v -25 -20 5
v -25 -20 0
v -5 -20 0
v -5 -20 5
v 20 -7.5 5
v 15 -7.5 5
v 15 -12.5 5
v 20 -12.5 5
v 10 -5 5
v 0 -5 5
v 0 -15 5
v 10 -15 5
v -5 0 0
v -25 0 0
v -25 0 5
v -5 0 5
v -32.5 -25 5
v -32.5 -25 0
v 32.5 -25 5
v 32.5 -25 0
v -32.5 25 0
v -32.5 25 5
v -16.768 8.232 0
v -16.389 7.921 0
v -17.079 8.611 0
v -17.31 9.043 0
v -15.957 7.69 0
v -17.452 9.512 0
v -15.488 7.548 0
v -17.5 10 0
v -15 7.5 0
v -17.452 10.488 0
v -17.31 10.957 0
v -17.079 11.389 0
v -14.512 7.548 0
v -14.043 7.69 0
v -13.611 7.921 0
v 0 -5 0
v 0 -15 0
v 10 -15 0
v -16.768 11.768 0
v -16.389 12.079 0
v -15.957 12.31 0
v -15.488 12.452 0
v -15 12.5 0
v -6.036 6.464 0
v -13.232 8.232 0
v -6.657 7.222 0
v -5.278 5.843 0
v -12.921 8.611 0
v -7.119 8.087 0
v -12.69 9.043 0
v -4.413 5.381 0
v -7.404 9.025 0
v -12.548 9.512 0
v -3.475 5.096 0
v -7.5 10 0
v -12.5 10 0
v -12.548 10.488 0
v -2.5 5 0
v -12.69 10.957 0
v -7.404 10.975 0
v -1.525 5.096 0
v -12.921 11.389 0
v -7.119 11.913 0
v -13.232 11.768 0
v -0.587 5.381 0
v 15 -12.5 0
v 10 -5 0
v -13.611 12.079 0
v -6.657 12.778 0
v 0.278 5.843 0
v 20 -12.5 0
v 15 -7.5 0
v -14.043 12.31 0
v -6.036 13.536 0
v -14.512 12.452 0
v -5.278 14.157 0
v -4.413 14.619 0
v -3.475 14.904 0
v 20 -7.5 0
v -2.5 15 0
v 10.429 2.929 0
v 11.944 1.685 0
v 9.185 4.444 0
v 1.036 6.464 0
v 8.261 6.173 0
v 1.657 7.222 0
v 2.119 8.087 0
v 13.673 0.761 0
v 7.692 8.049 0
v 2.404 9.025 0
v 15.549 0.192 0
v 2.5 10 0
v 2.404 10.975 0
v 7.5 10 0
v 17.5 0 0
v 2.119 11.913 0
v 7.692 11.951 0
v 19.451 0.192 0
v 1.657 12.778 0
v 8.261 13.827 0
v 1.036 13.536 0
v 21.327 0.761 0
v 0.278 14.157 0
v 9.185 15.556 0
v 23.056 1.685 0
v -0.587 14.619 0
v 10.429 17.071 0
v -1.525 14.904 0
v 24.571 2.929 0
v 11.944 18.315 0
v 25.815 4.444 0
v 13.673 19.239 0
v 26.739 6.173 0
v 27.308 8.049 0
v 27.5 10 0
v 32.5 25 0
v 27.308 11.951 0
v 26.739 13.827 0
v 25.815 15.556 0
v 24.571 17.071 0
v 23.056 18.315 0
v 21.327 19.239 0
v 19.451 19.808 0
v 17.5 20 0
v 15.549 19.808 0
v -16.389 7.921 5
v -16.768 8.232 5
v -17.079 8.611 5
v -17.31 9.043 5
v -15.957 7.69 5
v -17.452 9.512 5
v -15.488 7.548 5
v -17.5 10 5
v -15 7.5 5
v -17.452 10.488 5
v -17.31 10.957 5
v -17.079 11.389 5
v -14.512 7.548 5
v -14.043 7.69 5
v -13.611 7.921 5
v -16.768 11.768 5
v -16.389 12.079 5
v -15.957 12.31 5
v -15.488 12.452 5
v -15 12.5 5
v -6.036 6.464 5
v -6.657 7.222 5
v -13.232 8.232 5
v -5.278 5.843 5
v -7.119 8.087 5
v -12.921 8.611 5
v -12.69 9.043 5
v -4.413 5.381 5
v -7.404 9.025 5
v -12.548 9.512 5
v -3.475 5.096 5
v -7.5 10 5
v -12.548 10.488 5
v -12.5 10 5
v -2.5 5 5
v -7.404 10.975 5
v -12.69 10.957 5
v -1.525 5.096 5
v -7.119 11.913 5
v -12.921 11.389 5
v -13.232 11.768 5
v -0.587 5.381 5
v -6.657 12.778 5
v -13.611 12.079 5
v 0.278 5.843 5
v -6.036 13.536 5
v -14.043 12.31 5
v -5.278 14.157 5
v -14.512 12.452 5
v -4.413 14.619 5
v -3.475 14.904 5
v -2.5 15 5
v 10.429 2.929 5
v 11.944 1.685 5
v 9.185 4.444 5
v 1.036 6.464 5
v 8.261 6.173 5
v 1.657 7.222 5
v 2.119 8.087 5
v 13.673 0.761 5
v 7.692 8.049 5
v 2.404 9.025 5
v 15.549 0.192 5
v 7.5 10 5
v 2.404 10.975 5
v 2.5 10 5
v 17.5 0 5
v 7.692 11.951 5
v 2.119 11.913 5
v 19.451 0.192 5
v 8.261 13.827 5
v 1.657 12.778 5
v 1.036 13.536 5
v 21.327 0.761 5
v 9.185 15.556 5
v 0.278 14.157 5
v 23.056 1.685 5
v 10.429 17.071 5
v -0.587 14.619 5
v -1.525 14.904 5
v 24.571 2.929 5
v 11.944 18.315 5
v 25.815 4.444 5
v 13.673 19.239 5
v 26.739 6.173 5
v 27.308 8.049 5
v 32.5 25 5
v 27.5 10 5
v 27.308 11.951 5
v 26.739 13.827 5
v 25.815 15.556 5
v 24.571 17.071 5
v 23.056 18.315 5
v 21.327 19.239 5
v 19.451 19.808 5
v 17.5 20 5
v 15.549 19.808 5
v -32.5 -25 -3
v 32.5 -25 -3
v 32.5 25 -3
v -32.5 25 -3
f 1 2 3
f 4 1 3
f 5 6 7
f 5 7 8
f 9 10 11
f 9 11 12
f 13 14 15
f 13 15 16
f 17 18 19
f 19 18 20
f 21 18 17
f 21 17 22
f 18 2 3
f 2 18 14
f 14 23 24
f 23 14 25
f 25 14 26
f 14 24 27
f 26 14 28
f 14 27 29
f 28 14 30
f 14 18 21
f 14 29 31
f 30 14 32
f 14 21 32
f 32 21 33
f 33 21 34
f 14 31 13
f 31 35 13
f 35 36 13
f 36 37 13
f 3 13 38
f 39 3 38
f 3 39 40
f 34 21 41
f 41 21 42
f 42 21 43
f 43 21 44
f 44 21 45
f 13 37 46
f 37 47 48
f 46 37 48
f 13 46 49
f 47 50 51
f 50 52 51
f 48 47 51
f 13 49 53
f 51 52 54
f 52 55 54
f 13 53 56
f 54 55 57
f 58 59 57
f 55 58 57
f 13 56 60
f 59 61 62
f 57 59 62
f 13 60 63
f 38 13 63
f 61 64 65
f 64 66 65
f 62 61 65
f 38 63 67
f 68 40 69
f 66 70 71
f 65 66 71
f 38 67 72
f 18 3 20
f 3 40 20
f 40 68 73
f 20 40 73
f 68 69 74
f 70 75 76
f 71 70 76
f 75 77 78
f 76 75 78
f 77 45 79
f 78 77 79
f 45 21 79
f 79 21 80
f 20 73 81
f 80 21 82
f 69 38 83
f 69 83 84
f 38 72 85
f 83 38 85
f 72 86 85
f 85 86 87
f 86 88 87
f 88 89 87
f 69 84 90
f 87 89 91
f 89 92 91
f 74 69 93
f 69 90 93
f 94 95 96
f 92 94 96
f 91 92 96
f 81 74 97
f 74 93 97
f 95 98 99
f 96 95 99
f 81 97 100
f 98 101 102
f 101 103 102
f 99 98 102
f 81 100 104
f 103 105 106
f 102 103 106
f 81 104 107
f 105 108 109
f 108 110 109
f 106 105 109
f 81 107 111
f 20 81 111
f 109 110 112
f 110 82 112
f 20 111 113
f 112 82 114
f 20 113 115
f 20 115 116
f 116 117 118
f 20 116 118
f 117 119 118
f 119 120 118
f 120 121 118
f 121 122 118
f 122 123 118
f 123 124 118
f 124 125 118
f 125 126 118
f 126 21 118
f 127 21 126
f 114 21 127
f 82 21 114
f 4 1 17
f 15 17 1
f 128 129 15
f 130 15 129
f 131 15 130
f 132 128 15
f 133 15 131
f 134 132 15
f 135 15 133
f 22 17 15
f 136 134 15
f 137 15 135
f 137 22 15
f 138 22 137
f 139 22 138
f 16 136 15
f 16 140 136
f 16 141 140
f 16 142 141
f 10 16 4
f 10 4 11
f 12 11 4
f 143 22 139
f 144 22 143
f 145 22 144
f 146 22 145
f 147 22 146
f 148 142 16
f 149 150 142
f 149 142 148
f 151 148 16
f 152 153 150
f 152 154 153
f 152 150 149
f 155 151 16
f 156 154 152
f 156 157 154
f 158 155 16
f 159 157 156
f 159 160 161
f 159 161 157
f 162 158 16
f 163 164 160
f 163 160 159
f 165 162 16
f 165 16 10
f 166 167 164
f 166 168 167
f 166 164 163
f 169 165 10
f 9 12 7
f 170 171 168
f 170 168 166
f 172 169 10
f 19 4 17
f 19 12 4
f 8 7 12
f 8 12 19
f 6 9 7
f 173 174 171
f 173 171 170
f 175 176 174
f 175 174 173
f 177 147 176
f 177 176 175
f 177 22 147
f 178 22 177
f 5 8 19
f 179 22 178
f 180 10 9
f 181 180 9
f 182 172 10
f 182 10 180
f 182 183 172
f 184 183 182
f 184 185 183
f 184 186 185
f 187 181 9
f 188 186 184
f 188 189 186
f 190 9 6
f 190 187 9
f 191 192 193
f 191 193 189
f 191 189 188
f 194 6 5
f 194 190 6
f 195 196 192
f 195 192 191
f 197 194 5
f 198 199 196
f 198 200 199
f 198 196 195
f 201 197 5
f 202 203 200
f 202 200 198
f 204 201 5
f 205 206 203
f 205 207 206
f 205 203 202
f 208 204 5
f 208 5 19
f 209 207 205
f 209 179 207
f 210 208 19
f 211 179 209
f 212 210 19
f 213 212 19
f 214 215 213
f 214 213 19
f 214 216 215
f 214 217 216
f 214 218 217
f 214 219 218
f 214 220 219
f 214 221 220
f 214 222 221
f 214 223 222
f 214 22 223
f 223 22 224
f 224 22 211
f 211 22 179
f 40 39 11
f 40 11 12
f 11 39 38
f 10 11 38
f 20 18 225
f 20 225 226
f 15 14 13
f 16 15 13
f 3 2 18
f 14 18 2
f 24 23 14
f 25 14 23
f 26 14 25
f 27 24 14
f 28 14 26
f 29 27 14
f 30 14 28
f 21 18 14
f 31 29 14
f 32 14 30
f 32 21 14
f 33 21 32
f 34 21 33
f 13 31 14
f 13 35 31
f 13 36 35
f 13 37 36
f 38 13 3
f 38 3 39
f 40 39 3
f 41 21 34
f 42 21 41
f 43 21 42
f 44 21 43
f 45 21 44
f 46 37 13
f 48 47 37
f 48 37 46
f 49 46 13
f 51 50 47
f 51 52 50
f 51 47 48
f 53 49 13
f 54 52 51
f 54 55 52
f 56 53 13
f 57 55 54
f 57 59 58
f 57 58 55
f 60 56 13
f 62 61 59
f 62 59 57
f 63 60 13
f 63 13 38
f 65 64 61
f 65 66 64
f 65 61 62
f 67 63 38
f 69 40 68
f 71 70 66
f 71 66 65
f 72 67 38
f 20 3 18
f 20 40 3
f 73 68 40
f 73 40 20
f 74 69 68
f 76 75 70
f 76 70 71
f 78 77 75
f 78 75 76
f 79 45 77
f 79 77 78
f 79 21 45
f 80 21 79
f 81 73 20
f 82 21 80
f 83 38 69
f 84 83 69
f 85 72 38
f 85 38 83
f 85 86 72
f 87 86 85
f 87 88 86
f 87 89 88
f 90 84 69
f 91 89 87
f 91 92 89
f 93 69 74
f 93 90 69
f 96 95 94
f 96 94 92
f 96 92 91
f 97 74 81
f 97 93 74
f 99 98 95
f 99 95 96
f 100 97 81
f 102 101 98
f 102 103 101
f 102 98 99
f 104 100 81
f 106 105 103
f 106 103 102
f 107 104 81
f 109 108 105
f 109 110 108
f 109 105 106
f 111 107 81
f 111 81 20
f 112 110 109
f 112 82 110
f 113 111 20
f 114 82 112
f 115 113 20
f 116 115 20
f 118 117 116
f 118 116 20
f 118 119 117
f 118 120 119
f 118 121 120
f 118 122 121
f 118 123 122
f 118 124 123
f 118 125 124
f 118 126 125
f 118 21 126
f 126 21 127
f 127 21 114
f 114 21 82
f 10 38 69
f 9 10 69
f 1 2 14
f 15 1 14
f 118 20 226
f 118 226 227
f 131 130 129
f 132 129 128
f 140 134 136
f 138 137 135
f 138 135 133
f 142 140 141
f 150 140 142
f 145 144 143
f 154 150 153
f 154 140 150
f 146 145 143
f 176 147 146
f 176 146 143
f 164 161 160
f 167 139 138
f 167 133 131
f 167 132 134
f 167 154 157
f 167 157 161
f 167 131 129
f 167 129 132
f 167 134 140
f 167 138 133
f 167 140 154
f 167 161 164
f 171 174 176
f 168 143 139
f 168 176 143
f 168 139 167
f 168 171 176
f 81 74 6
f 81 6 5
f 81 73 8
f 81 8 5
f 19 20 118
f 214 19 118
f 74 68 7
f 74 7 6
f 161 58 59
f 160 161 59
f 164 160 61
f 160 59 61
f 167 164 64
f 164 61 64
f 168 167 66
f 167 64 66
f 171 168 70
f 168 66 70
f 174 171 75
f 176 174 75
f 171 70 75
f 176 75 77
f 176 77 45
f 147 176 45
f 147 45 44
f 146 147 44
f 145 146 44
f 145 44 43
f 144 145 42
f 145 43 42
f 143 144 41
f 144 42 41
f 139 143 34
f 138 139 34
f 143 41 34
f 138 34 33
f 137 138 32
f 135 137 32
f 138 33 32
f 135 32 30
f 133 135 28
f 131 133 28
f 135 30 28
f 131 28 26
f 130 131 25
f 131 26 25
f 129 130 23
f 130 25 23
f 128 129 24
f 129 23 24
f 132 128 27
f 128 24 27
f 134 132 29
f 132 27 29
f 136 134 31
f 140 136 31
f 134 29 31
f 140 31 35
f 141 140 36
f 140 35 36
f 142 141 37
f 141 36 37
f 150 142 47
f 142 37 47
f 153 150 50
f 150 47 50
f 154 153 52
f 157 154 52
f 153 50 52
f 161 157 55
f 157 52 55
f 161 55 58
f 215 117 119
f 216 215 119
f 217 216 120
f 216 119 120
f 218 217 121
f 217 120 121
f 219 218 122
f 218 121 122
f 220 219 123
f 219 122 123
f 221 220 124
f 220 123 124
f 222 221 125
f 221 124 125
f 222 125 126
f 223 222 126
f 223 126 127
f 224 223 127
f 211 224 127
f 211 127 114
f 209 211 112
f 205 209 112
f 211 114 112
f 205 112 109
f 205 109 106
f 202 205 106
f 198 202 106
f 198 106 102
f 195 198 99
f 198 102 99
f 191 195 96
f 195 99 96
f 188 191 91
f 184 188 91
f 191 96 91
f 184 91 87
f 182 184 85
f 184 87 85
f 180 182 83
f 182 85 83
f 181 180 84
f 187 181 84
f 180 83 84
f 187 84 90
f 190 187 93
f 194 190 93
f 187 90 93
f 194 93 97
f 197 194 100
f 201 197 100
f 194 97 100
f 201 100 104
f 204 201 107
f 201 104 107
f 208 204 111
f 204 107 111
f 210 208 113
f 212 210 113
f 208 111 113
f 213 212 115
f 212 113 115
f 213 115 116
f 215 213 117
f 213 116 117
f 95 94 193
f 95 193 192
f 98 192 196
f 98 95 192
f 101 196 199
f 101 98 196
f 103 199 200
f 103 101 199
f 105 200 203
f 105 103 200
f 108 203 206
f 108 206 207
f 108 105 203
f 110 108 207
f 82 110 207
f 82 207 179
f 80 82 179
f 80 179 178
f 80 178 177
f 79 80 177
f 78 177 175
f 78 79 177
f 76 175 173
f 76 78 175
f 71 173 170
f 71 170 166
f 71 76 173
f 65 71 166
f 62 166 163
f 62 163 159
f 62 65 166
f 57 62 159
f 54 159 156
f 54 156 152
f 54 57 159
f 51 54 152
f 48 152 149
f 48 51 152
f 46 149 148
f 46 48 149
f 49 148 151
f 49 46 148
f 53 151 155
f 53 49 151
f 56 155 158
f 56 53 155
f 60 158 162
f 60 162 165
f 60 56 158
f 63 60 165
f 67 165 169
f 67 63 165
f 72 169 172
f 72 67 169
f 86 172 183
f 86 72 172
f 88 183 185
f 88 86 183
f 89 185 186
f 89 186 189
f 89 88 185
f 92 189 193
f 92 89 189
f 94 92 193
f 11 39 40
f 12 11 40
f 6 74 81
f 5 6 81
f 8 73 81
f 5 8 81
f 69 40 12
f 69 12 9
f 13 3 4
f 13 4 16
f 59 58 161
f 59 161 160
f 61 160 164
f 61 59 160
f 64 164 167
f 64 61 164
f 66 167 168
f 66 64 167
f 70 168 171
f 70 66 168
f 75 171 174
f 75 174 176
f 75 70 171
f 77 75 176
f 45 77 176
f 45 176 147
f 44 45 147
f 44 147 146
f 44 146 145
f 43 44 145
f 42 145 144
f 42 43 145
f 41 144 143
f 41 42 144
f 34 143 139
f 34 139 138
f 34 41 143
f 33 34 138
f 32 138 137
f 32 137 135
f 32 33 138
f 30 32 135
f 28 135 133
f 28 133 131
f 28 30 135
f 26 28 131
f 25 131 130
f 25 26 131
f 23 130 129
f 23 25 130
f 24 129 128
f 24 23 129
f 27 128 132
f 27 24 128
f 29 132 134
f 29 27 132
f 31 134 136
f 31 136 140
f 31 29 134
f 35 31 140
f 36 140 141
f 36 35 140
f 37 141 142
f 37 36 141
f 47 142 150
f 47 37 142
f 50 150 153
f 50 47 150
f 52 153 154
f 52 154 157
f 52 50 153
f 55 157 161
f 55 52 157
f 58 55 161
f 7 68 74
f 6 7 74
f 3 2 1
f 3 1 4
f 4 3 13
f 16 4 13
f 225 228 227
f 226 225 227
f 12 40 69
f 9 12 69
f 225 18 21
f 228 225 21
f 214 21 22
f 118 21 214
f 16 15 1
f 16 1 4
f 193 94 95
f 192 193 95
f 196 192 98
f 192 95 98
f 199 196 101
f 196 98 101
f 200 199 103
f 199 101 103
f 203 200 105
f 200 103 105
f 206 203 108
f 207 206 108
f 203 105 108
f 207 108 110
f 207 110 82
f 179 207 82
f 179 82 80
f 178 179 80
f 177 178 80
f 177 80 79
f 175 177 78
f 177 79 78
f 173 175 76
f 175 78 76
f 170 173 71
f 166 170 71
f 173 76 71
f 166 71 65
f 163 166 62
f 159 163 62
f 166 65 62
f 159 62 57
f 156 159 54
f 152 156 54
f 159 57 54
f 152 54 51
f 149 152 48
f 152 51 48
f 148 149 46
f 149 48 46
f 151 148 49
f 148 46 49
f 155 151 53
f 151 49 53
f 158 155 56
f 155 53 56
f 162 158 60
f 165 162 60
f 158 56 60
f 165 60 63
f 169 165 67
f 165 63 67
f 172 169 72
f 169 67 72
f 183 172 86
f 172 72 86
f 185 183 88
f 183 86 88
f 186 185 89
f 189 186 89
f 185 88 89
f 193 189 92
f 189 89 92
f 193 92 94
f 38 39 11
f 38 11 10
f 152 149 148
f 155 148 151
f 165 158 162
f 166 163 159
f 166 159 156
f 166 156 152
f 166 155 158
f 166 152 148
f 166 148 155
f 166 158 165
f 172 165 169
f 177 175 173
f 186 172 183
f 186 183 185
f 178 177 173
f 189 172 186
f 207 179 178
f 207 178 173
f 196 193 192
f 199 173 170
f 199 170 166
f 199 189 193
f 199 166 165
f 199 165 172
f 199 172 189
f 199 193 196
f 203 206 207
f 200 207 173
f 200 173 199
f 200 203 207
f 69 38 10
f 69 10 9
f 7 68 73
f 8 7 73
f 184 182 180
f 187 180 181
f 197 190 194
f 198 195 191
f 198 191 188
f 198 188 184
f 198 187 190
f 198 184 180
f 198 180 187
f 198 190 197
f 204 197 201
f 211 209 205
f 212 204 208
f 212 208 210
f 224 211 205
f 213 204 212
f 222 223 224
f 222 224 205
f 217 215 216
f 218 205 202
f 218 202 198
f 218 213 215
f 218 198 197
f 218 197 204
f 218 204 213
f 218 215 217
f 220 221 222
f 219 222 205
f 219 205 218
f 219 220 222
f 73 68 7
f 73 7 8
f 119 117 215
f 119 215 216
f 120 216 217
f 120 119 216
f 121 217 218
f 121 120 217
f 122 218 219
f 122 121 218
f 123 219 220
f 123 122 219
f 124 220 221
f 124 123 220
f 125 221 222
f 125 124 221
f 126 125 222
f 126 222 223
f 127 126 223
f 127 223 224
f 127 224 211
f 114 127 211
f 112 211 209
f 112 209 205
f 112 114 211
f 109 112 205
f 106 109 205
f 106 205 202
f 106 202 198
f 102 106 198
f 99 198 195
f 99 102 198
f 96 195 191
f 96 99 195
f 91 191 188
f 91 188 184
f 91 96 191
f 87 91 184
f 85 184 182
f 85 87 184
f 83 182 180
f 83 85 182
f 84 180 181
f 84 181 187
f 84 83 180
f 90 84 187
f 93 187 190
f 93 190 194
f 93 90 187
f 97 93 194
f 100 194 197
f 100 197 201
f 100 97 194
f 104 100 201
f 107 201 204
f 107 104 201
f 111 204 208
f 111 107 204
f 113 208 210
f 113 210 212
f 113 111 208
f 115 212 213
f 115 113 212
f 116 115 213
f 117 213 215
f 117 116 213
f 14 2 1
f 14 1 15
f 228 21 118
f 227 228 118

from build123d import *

# Parameters (mm, degrees)
F0_W     = 65
F0_H     = 50
F0_W_2   = 20
F0_H_2   = 20
F0_W_3   = 10
F0_H_3   = 10
F0_W_4   = 5
F0_H_4   = 5
F0_R     = 2.5
F0_R_2   = 5
F0_R_3   = 10
F1_DEPTH = 5
F2_DEPTH = 5
F3_DEPTH = 3


with BuildPart() as f1:
    # F0 (on Top) → F1 (new body)
    with BuildSketch(Plane.XY):
        Rectangle(F0_W, F0_H)
        with Locations((-15, -10)):
            Rectangle(F0_W_2, F0_H_2, mode=Mode.SUBTRACT)
        with Locations((5, -10)):
            Rectangle(F0_W_3, F0_H_3, mode=Mode.SUBTRACT)
        with Locations((17.5, -10)):
            Rectangle(F0_W_4, F0_H_4, mode=Mode.SUBTRACT)
        with Locations((-15, 10)):
            Circle(F0_R, mode=Mode.SUBTRACT)
        with Locations((-2.5, 10)):
            Circle(F0_R_2, mode=Mode.SUBTRACT)
        with Locations((17.5, 10)):
            Circle(F0_R_3, mode=Mode.SUBTRACT)
    extrude(amount=F1_DEPTH)


with BuildPart() as f2:
    # F0 (on Top) → F2 (new body)
    with BuildSketch(Plane.XY):
        with Locations((-15, -10)):
            Rectangle(F0_W_2, F0_H_2)
    extrude(amount=F2_DEPTH)



with BuildPart() as f2b:
    # F0 (on Top) → F2, piece 2 (new body)
    with BuildSketch(Plane.XY):
        with Locations((5, -10)):
            Rectangle(F0_W_3, F0_H_3)
    extrude(amount=F2_DEPTH)


with BuildPart() as f2c:
    # F0 (on Top) → F2, piece 3 (new body)
    with BuildSketch(Plane.XY):
        with Locations((17.5, -10)):
            Rectangle(F0_W_4, F0_H_4)
    extrude(amount=F2_DEPTH)


with BuildPart() as f2d:
    # F0 (on Top) → F2, piece 4 (new body)
    with BuildSketch(Plane.XY):
        with Locations((17.5, 10)):
            Circle(F0_R_3)
    extrude(amount=F2_DEPTH)


with BuildPart() as f2e:
    # F0 (on Top) → F2, piece 5 (new body)
    with BuildSketch(Plane.XY):
        with Locations((-2.5, 10)):
            Circle(F0_R_2)
    extrude(amount=F2_DEPTH)


with BuildPart() as f2f:
    # F0 (on Top) → F2, piece 6 (new body)
    with BuildSketch(Plane.XY):
        with Locations((-15, 10)):
            Circle(F0_R)
    extrude(amount=F2_DEPTH)


with BuildPart() as f2_1:
    add(f2.part)

    add(f2b.part)  # F3 merges F2b

    add(f2c.part)  # F3 merges F2c

    add(f2d.part)  # F3 merges F2d

    add(f2e.part)  # F3 merges F2e

    add(f2f.part)  # F3 merges F2f
    # F0 (on Top) → F3 (join)
    with BuildSketch(Plane.XY):
        Rectangle(F0_W, F0_H)
        with Locations((-15, -10)):
            Rectangle(F0_W_2, F0_H_2, mode=Mode.SUBTRACT)
        with Locations((5, -10)):
            Rectangle(F0_W_3, F0_H_3, mode=Mode.SUBTRACT)
        with Locations((17.5, -10)):
            Rectangle(F0_W_4, F0_H_4, mode=Mode.SUBTRACT)
        with Locations((-15, 10)):
            Circle(F0_R, mode=Mode.SUBTRACT)
        with Locations((-2.5, 10)):
            Circle(F0_R_2, mode=Mode.SUBTRACT)
        with Locations((17.5, 10)):
            Circle(F0_R_3, mode=Mode.SUBTRACT)
        with Locations((-15, -10)):
            Rectangle(F0_W_2, F0_H_2)
        with Locations((-15, 10)):
            Circle(F0_R)
        with Locations((-2.5, 10)):
            Circle(F0_R_2)
        with Locations((5, -10)):
            Rectangle(F0_W_3, F0_H_3)
        with Locations((17.5, -10)):
            Rectangle(F0_W_4, F0_H_4)
        with Locations((17.5, 10)):
            Circle(F0_R_3)
    extrude(amount=-F3_DEPTH)


solid = Compound([f1.part, f2_1.part])
